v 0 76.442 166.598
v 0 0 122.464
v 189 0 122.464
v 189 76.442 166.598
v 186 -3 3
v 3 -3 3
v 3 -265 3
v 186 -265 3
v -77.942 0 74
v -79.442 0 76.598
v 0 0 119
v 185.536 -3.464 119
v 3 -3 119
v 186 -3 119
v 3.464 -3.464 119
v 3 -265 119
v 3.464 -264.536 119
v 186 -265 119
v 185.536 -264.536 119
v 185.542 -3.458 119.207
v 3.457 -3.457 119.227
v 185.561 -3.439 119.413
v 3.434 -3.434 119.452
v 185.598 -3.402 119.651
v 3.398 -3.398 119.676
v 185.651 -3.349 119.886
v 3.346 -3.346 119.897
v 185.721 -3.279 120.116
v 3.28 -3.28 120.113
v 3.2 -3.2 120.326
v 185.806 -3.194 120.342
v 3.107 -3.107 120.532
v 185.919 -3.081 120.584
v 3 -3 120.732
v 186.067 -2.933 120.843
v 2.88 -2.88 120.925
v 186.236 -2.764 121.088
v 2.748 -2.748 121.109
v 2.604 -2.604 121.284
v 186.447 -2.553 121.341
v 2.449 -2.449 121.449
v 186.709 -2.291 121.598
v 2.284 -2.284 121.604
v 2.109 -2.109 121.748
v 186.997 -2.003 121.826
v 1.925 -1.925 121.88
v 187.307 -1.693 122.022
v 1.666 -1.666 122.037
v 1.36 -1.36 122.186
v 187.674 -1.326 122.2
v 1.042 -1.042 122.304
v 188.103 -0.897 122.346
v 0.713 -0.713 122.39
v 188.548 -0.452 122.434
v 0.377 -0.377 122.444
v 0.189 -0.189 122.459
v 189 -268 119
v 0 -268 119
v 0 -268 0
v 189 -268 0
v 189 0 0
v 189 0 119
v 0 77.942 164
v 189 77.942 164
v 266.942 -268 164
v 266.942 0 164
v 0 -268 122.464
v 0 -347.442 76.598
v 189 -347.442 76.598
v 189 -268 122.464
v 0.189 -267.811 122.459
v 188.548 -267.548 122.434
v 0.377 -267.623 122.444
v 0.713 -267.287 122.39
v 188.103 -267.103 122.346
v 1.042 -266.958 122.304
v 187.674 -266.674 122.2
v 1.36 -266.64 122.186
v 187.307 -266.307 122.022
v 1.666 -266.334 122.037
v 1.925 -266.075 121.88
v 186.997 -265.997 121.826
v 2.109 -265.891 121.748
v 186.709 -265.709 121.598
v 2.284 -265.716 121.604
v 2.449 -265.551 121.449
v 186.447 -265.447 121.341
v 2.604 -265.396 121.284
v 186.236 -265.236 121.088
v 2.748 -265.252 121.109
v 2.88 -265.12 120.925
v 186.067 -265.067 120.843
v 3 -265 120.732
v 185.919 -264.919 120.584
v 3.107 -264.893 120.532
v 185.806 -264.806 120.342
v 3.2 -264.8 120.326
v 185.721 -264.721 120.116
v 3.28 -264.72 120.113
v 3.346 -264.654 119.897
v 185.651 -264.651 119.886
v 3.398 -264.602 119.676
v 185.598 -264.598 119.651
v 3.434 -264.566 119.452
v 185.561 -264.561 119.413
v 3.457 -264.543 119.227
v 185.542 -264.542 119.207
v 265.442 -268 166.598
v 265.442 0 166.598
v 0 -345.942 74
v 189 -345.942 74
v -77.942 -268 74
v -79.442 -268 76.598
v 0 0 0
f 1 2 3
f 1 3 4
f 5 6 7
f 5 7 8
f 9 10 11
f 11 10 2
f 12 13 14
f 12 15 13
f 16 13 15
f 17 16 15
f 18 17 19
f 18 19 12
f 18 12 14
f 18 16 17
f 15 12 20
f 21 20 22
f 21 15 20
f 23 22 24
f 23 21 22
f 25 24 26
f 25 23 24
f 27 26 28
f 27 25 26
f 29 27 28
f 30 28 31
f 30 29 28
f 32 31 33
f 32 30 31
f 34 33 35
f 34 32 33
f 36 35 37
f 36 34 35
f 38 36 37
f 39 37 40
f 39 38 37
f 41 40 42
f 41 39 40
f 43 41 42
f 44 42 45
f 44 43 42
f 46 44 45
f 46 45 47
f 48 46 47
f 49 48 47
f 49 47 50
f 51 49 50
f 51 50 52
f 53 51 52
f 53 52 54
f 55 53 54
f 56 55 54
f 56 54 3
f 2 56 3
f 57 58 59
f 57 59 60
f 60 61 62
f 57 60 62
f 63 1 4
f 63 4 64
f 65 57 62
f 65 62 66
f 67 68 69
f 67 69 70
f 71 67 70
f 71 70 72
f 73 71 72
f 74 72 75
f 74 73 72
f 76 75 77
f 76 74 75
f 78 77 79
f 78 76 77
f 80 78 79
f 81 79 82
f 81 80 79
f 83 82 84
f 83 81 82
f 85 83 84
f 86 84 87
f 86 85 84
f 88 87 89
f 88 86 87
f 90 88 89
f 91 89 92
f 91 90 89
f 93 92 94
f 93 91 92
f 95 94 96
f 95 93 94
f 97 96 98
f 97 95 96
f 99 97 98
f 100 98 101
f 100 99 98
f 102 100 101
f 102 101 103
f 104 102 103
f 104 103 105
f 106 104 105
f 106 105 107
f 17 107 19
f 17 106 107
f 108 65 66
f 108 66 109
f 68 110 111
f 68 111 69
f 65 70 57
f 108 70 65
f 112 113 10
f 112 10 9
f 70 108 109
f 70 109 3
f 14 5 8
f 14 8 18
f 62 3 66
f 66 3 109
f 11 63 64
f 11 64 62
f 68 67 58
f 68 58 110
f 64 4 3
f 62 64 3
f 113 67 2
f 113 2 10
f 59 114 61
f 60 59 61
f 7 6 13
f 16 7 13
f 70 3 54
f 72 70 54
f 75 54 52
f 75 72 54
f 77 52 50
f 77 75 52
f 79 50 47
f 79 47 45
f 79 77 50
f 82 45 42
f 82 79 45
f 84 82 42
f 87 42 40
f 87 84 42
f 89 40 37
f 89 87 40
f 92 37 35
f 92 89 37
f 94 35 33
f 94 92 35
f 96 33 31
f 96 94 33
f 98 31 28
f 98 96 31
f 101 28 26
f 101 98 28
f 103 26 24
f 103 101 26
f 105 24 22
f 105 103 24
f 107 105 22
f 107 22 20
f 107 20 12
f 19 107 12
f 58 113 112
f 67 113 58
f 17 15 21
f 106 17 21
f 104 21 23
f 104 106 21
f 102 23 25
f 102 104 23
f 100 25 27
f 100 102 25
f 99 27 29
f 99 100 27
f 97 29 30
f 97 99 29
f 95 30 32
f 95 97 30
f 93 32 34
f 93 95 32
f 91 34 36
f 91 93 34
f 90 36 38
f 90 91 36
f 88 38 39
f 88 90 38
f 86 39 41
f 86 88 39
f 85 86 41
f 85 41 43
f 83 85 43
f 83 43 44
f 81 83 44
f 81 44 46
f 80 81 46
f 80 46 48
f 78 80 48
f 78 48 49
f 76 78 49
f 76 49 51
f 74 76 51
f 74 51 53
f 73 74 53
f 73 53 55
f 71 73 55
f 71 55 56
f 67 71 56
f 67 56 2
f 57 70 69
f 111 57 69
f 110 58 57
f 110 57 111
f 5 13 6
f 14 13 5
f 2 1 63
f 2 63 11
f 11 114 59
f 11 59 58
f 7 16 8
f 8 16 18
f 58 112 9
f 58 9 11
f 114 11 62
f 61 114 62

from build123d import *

# Parameters (mm, degrees)
F0_W     = 189
F0_H     = 119
F1_DEPTH = 268
F2_T     = -3
F4_DEPTH = 268
F6_DEPTH = 189


with BuildPart() as f1:
    # F0 (on Front) → F1 (new body)
    with BuildSketch(Plane.XZ):
        with Locations((94.5, 59.5)):
            Rectangle(F0_W, F0_H)
    extrude(amount=F1_DEPTH)

    # F2
    f2_openings = [f1.faces().sort_by_distance(p)[0] for p in [
        (94.5, -134, 119),
    ]]
    offset(amount=F2_T, openings=f2_openings)

    # F3 (on face) → F4 (join, through all)
    with BuildSketch(Plane.XZ.offset(268)):
        with BuildLine():
            Line((-77.942286, 74), (0, 119))
            Line((0, 119), (3.464102, 119))
            ThreePointArc((3.464102, 119), (2.44949, 121.44949), (0, 122.464102))
            Line((0, 122.464102), (-79.442286, 76.598076))
            Line((-79.442286, 76.598076), (-77.942286, 74))
        make_face()
        with BuildLine():
            Line((185.535898, 119), (189, 119))
            Line((189, 119), (266.942286, 164))
            Line((266.942286, 164), (265.442286, 166.598076))
            Line((265.442286, 166.598076), (189, 122.464102))
            ThreePointArc((189, 122.464102), (186.55051, 121.44949), (185.535898, 119))
        make_face()
    extrude(amount=-F4_DEPTH)

    # F5 (on face) → F6 (join, through all)
    with BuildSketch(Plane(origin=(0, 0, 0), x_dir=(0, -1, 0), z_dir=(-1, 0, 0))):
        with BuildLine():
            Line((264.535898, 119), (268, 119))
            Line((268, 119), (345.942286, 74))
            Line((345.942286, 74), (347.442286, 76.598076))
            Line((347.442286, 76.598076), (268, 122.464102))
            ThreePointArc((268, 122.464102), (265.55051, 121.44949), (264.535898, 119))
        make_face()
        with BuildLine():
            Line((-77.942286, 164), (0, 119))
            Line((0, 119), (3.464102, 119))
            ThreePointArc((3.464102, 119), (2.44949, 121.44949), (0, 122.464102))
            Line((0, 122.464102), (-76.442286, 166.598076))
            Line((-76.442286, 166.598076), (-77.942286, 164))
        make_face()
    extrude(amount=-F6_DEPTH)


solid = f1.part
